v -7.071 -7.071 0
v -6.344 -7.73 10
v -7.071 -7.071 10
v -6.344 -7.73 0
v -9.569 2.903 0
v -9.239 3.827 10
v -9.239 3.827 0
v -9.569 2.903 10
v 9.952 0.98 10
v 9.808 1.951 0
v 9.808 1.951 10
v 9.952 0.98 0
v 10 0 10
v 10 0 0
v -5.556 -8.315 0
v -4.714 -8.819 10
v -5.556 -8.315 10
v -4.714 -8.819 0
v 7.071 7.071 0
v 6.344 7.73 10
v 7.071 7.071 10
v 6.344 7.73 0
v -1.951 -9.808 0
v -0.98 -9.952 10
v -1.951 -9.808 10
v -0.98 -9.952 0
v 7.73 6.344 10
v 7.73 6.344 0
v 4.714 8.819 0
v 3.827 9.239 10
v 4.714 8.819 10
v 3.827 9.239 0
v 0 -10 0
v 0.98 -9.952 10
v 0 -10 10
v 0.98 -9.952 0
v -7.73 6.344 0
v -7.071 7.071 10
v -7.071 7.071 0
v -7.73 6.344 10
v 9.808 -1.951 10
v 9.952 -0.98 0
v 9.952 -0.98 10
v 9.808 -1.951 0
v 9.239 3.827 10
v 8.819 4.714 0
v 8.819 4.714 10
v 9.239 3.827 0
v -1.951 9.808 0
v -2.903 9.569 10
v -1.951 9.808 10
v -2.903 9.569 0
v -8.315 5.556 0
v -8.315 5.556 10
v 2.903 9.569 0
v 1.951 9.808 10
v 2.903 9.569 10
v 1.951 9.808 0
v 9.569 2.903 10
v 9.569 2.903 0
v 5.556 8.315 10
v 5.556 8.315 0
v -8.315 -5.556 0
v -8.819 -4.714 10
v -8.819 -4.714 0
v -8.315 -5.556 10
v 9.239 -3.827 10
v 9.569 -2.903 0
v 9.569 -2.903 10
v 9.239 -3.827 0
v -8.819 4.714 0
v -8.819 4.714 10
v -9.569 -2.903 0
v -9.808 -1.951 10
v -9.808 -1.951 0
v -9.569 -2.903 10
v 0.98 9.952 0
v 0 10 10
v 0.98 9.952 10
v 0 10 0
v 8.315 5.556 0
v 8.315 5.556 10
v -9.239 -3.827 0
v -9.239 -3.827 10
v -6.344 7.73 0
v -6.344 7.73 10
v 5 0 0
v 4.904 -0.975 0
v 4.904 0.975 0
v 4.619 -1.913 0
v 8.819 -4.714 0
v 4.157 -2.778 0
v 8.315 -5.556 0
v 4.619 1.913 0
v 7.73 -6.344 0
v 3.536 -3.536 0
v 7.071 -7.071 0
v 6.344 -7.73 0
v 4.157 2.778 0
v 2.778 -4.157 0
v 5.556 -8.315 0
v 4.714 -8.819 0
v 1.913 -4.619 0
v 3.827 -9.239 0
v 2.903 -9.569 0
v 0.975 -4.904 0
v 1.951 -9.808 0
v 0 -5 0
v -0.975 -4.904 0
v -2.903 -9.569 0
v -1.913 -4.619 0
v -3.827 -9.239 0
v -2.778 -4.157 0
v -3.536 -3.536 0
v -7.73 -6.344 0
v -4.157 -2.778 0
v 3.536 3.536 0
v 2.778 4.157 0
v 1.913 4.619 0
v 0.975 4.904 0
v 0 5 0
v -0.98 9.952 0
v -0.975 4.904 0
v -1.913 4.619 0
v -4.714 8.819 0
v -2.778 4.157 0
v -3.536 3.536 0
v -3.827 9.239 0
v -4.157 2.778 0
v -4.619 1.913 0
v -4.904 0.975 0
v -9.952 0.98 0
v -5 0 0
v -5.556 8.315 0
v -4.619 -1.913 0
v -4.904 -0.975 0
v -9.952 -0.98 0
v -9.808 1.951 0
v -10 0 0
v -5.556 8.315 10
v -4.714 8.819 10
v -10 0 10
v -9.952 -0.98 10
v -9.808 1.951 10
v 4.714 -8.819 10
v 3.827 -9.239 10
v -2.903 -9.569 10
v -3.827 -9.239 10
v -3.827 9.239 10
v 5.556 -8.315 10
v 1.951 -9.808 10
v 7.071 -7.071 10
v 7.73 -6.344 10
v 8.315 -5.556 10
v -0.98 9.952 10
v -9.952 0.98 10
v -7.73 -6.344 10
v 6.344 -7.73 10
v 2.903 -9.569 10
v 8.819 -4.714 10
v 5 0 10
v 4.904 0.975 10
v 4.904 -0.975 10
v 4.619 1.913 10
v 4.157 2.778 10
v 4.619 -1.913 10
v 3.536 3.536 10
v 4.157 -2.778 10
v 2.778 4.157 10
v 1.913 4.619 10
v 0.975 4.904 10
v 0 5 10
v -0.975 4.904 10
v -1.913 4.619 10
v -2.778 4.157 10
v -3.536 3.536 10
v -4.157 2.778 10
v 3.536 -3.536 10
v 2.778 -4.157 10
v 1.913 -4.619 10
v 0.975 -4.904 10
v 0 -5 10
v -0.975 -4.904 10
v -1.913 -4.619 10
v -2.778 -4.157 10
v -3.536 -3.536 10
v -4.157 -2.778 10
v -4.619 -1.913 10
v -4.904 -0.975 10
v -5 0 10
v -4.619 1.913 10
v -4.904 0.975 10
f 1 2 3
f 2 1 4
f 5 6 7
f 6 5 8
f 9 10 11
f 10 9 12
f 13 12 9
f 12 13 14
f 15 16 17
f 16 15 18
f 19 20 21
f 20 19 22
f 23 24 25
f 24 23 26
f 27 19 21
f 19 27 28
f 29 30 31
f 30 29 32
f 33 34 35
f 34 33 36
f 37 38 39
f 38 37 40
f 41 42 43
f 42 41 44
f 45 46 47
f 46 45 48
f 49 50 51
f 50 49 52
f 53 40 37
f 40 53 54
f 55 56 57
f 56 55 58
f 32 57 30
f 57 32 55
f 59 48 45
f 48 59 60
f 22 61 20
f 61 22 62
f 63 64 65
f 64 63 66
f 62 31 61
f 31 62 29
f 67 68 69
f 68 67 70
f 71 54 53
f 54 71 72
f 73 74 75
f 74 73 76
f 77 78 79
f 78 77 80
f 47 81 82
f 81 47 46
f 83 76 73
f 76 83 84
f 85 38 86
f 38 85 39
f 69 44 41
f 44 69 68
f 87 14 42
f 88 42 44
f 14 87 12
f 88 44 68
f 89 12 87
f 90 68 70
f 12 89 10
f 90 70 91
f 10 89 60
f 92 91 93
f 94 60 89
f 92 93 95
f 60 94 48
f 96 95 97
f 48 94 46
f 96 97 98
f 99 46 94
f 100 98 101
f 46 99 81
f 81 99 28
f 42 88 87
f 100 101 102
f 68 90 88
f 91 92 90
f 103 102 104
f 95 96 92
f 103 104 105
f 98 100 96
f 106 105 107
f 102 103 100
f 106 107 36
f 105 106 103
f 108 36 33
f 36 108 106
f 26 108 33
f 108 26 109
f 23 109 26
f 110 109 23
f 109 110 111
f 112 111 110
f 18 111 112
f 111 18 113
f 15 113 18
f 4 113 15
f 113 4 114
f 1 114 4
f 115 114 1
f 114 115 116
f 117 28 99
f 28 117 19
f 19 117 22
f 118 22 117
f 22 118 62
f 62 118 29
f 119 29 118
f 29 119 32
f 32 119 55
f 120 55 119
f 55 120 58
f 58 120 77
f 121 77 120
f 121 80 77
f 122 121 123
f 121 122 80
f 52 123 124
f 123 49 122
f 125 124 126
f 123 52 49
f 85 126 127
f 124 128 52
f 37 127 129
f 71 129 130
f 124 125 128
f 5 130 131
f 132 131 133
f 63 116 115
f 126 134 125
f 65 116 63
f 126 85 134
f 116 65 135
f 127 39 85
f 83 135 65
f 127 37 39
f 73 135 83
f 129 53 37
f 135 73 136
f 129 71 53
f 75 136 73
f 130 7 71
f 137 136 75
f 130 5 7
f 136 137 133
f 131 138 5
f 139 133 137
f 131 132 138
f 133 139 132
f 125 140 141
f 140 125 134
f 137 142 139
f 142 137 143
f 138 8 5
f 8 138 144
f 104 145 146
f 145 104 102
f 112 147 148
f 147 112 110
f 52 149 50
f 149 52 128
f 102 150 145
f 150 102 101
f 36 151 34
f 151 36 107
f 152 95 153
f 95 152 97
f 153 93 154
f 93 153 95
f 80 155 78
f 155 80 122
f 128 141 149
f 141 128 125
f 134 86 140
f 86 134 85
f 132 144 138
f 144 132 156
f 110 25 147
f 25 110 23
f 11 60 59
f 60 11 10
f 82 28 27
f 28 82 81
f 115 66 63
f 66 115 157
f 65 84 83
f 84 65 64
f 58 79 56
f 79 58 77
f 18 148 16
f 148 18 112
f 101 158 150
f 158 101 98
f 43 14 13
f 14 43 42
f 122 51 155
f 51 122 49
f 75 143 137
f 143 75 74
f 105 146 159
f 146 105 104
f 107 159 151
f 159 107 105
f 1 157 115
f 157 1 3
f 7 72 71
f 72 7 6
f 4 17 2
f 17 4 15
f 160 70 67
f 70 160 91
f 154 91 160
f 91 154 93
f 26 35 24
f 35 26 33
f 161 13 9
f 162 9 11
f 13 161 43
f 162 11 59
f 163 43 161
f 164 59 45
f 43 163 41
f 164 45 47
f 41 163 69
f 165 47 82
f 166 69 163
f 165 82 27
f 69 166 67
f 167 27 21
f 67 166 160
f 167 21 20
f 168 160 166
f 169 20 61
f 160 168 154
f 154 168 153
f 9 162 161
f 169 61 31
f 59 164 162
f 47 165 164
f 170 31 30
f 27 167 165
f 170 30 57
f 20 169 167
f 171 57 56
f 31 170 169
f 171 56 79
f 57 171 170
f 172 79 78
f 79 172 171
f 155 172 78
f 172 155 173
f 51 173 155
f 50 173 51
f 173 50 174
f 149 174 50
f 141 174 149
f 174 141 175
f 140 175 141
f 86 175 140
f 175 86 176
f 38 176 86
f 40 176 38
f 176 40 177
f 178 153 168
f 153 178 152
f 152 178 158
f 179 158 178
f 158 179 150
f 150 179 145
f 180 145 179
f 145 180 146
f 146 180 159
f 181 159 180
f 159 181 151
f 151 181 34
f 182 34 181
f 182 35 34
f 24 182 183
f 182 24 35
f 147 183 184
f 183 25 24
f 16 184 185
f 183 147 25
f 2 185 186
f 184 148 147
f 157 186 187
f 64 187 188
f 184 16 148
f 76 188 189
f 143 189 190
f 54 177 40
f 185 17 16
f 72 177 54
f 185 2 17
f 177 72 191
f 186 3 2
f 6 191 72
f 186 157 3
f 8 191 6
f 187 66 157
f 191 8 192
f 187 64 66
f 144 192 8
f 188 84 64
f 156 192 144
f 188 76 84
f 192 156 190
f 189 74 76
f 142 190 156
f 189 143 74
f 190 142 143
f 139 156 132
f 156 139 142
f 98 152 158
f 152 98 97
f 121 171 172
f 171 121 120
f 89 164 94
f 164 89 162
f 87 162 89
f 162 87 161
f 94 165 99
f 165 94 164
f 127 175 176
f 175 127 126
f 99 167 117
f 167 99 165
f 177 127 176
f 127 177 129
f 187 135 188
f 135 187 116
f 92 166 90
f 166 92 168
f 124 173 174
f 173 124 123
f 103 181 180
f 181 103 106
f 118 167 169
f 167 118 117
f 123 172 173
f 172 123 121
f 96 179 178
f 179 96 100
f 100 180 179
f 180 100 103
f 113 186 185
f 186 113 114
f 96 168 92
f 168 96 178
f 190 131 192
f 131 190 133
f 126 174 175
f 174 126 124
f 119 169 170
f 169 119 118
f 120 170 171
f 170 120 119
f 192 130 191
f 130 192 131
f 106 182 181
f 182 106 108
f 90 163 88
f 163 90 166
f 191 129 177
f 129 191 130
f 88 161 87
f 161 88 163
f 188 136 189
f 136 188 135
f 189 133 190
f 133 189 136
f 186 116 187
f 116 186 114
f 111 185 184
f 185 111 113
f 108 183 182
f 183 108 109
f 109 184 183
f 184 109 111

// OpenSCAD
/* Simple Customizer example.
 * See http://customizer.makerbot.com/docs for more info on making a customizer-compatible SCAD file.
 * See https://www.thingiverse.com/thing:2812634 for instructions on using customizer inside the latest OpenSCAD builds. */

// Diameter of the disk
diameter = 20;

// Height of the disk
height = 10;

// Segments in the outer surface
segments = 64; //[3:128]

// Make a hole in the middle?
hole = "yes"; //[yes,no]

/* [Hidden] */
r = diameter / 2;
segments2 = segments > 6 ? round(segments/2) : 3;
// Boolean options work in the OpenSCAD customizer: they will show up as a checkbox. They don't work in the Thingiverse customizer however at the time of this writing. Therefore either compare with "yes" every time, or convert the value to a boolean for cleaner code:
bHole = (hole == "yes");

difference() {
    cylinder(r=r, height, $fn=segments);

    if(bHole) {
        translate([0, 0, -height/2]) cylinder(r=r/2, height*2, $fn=segments2);
    }
}
